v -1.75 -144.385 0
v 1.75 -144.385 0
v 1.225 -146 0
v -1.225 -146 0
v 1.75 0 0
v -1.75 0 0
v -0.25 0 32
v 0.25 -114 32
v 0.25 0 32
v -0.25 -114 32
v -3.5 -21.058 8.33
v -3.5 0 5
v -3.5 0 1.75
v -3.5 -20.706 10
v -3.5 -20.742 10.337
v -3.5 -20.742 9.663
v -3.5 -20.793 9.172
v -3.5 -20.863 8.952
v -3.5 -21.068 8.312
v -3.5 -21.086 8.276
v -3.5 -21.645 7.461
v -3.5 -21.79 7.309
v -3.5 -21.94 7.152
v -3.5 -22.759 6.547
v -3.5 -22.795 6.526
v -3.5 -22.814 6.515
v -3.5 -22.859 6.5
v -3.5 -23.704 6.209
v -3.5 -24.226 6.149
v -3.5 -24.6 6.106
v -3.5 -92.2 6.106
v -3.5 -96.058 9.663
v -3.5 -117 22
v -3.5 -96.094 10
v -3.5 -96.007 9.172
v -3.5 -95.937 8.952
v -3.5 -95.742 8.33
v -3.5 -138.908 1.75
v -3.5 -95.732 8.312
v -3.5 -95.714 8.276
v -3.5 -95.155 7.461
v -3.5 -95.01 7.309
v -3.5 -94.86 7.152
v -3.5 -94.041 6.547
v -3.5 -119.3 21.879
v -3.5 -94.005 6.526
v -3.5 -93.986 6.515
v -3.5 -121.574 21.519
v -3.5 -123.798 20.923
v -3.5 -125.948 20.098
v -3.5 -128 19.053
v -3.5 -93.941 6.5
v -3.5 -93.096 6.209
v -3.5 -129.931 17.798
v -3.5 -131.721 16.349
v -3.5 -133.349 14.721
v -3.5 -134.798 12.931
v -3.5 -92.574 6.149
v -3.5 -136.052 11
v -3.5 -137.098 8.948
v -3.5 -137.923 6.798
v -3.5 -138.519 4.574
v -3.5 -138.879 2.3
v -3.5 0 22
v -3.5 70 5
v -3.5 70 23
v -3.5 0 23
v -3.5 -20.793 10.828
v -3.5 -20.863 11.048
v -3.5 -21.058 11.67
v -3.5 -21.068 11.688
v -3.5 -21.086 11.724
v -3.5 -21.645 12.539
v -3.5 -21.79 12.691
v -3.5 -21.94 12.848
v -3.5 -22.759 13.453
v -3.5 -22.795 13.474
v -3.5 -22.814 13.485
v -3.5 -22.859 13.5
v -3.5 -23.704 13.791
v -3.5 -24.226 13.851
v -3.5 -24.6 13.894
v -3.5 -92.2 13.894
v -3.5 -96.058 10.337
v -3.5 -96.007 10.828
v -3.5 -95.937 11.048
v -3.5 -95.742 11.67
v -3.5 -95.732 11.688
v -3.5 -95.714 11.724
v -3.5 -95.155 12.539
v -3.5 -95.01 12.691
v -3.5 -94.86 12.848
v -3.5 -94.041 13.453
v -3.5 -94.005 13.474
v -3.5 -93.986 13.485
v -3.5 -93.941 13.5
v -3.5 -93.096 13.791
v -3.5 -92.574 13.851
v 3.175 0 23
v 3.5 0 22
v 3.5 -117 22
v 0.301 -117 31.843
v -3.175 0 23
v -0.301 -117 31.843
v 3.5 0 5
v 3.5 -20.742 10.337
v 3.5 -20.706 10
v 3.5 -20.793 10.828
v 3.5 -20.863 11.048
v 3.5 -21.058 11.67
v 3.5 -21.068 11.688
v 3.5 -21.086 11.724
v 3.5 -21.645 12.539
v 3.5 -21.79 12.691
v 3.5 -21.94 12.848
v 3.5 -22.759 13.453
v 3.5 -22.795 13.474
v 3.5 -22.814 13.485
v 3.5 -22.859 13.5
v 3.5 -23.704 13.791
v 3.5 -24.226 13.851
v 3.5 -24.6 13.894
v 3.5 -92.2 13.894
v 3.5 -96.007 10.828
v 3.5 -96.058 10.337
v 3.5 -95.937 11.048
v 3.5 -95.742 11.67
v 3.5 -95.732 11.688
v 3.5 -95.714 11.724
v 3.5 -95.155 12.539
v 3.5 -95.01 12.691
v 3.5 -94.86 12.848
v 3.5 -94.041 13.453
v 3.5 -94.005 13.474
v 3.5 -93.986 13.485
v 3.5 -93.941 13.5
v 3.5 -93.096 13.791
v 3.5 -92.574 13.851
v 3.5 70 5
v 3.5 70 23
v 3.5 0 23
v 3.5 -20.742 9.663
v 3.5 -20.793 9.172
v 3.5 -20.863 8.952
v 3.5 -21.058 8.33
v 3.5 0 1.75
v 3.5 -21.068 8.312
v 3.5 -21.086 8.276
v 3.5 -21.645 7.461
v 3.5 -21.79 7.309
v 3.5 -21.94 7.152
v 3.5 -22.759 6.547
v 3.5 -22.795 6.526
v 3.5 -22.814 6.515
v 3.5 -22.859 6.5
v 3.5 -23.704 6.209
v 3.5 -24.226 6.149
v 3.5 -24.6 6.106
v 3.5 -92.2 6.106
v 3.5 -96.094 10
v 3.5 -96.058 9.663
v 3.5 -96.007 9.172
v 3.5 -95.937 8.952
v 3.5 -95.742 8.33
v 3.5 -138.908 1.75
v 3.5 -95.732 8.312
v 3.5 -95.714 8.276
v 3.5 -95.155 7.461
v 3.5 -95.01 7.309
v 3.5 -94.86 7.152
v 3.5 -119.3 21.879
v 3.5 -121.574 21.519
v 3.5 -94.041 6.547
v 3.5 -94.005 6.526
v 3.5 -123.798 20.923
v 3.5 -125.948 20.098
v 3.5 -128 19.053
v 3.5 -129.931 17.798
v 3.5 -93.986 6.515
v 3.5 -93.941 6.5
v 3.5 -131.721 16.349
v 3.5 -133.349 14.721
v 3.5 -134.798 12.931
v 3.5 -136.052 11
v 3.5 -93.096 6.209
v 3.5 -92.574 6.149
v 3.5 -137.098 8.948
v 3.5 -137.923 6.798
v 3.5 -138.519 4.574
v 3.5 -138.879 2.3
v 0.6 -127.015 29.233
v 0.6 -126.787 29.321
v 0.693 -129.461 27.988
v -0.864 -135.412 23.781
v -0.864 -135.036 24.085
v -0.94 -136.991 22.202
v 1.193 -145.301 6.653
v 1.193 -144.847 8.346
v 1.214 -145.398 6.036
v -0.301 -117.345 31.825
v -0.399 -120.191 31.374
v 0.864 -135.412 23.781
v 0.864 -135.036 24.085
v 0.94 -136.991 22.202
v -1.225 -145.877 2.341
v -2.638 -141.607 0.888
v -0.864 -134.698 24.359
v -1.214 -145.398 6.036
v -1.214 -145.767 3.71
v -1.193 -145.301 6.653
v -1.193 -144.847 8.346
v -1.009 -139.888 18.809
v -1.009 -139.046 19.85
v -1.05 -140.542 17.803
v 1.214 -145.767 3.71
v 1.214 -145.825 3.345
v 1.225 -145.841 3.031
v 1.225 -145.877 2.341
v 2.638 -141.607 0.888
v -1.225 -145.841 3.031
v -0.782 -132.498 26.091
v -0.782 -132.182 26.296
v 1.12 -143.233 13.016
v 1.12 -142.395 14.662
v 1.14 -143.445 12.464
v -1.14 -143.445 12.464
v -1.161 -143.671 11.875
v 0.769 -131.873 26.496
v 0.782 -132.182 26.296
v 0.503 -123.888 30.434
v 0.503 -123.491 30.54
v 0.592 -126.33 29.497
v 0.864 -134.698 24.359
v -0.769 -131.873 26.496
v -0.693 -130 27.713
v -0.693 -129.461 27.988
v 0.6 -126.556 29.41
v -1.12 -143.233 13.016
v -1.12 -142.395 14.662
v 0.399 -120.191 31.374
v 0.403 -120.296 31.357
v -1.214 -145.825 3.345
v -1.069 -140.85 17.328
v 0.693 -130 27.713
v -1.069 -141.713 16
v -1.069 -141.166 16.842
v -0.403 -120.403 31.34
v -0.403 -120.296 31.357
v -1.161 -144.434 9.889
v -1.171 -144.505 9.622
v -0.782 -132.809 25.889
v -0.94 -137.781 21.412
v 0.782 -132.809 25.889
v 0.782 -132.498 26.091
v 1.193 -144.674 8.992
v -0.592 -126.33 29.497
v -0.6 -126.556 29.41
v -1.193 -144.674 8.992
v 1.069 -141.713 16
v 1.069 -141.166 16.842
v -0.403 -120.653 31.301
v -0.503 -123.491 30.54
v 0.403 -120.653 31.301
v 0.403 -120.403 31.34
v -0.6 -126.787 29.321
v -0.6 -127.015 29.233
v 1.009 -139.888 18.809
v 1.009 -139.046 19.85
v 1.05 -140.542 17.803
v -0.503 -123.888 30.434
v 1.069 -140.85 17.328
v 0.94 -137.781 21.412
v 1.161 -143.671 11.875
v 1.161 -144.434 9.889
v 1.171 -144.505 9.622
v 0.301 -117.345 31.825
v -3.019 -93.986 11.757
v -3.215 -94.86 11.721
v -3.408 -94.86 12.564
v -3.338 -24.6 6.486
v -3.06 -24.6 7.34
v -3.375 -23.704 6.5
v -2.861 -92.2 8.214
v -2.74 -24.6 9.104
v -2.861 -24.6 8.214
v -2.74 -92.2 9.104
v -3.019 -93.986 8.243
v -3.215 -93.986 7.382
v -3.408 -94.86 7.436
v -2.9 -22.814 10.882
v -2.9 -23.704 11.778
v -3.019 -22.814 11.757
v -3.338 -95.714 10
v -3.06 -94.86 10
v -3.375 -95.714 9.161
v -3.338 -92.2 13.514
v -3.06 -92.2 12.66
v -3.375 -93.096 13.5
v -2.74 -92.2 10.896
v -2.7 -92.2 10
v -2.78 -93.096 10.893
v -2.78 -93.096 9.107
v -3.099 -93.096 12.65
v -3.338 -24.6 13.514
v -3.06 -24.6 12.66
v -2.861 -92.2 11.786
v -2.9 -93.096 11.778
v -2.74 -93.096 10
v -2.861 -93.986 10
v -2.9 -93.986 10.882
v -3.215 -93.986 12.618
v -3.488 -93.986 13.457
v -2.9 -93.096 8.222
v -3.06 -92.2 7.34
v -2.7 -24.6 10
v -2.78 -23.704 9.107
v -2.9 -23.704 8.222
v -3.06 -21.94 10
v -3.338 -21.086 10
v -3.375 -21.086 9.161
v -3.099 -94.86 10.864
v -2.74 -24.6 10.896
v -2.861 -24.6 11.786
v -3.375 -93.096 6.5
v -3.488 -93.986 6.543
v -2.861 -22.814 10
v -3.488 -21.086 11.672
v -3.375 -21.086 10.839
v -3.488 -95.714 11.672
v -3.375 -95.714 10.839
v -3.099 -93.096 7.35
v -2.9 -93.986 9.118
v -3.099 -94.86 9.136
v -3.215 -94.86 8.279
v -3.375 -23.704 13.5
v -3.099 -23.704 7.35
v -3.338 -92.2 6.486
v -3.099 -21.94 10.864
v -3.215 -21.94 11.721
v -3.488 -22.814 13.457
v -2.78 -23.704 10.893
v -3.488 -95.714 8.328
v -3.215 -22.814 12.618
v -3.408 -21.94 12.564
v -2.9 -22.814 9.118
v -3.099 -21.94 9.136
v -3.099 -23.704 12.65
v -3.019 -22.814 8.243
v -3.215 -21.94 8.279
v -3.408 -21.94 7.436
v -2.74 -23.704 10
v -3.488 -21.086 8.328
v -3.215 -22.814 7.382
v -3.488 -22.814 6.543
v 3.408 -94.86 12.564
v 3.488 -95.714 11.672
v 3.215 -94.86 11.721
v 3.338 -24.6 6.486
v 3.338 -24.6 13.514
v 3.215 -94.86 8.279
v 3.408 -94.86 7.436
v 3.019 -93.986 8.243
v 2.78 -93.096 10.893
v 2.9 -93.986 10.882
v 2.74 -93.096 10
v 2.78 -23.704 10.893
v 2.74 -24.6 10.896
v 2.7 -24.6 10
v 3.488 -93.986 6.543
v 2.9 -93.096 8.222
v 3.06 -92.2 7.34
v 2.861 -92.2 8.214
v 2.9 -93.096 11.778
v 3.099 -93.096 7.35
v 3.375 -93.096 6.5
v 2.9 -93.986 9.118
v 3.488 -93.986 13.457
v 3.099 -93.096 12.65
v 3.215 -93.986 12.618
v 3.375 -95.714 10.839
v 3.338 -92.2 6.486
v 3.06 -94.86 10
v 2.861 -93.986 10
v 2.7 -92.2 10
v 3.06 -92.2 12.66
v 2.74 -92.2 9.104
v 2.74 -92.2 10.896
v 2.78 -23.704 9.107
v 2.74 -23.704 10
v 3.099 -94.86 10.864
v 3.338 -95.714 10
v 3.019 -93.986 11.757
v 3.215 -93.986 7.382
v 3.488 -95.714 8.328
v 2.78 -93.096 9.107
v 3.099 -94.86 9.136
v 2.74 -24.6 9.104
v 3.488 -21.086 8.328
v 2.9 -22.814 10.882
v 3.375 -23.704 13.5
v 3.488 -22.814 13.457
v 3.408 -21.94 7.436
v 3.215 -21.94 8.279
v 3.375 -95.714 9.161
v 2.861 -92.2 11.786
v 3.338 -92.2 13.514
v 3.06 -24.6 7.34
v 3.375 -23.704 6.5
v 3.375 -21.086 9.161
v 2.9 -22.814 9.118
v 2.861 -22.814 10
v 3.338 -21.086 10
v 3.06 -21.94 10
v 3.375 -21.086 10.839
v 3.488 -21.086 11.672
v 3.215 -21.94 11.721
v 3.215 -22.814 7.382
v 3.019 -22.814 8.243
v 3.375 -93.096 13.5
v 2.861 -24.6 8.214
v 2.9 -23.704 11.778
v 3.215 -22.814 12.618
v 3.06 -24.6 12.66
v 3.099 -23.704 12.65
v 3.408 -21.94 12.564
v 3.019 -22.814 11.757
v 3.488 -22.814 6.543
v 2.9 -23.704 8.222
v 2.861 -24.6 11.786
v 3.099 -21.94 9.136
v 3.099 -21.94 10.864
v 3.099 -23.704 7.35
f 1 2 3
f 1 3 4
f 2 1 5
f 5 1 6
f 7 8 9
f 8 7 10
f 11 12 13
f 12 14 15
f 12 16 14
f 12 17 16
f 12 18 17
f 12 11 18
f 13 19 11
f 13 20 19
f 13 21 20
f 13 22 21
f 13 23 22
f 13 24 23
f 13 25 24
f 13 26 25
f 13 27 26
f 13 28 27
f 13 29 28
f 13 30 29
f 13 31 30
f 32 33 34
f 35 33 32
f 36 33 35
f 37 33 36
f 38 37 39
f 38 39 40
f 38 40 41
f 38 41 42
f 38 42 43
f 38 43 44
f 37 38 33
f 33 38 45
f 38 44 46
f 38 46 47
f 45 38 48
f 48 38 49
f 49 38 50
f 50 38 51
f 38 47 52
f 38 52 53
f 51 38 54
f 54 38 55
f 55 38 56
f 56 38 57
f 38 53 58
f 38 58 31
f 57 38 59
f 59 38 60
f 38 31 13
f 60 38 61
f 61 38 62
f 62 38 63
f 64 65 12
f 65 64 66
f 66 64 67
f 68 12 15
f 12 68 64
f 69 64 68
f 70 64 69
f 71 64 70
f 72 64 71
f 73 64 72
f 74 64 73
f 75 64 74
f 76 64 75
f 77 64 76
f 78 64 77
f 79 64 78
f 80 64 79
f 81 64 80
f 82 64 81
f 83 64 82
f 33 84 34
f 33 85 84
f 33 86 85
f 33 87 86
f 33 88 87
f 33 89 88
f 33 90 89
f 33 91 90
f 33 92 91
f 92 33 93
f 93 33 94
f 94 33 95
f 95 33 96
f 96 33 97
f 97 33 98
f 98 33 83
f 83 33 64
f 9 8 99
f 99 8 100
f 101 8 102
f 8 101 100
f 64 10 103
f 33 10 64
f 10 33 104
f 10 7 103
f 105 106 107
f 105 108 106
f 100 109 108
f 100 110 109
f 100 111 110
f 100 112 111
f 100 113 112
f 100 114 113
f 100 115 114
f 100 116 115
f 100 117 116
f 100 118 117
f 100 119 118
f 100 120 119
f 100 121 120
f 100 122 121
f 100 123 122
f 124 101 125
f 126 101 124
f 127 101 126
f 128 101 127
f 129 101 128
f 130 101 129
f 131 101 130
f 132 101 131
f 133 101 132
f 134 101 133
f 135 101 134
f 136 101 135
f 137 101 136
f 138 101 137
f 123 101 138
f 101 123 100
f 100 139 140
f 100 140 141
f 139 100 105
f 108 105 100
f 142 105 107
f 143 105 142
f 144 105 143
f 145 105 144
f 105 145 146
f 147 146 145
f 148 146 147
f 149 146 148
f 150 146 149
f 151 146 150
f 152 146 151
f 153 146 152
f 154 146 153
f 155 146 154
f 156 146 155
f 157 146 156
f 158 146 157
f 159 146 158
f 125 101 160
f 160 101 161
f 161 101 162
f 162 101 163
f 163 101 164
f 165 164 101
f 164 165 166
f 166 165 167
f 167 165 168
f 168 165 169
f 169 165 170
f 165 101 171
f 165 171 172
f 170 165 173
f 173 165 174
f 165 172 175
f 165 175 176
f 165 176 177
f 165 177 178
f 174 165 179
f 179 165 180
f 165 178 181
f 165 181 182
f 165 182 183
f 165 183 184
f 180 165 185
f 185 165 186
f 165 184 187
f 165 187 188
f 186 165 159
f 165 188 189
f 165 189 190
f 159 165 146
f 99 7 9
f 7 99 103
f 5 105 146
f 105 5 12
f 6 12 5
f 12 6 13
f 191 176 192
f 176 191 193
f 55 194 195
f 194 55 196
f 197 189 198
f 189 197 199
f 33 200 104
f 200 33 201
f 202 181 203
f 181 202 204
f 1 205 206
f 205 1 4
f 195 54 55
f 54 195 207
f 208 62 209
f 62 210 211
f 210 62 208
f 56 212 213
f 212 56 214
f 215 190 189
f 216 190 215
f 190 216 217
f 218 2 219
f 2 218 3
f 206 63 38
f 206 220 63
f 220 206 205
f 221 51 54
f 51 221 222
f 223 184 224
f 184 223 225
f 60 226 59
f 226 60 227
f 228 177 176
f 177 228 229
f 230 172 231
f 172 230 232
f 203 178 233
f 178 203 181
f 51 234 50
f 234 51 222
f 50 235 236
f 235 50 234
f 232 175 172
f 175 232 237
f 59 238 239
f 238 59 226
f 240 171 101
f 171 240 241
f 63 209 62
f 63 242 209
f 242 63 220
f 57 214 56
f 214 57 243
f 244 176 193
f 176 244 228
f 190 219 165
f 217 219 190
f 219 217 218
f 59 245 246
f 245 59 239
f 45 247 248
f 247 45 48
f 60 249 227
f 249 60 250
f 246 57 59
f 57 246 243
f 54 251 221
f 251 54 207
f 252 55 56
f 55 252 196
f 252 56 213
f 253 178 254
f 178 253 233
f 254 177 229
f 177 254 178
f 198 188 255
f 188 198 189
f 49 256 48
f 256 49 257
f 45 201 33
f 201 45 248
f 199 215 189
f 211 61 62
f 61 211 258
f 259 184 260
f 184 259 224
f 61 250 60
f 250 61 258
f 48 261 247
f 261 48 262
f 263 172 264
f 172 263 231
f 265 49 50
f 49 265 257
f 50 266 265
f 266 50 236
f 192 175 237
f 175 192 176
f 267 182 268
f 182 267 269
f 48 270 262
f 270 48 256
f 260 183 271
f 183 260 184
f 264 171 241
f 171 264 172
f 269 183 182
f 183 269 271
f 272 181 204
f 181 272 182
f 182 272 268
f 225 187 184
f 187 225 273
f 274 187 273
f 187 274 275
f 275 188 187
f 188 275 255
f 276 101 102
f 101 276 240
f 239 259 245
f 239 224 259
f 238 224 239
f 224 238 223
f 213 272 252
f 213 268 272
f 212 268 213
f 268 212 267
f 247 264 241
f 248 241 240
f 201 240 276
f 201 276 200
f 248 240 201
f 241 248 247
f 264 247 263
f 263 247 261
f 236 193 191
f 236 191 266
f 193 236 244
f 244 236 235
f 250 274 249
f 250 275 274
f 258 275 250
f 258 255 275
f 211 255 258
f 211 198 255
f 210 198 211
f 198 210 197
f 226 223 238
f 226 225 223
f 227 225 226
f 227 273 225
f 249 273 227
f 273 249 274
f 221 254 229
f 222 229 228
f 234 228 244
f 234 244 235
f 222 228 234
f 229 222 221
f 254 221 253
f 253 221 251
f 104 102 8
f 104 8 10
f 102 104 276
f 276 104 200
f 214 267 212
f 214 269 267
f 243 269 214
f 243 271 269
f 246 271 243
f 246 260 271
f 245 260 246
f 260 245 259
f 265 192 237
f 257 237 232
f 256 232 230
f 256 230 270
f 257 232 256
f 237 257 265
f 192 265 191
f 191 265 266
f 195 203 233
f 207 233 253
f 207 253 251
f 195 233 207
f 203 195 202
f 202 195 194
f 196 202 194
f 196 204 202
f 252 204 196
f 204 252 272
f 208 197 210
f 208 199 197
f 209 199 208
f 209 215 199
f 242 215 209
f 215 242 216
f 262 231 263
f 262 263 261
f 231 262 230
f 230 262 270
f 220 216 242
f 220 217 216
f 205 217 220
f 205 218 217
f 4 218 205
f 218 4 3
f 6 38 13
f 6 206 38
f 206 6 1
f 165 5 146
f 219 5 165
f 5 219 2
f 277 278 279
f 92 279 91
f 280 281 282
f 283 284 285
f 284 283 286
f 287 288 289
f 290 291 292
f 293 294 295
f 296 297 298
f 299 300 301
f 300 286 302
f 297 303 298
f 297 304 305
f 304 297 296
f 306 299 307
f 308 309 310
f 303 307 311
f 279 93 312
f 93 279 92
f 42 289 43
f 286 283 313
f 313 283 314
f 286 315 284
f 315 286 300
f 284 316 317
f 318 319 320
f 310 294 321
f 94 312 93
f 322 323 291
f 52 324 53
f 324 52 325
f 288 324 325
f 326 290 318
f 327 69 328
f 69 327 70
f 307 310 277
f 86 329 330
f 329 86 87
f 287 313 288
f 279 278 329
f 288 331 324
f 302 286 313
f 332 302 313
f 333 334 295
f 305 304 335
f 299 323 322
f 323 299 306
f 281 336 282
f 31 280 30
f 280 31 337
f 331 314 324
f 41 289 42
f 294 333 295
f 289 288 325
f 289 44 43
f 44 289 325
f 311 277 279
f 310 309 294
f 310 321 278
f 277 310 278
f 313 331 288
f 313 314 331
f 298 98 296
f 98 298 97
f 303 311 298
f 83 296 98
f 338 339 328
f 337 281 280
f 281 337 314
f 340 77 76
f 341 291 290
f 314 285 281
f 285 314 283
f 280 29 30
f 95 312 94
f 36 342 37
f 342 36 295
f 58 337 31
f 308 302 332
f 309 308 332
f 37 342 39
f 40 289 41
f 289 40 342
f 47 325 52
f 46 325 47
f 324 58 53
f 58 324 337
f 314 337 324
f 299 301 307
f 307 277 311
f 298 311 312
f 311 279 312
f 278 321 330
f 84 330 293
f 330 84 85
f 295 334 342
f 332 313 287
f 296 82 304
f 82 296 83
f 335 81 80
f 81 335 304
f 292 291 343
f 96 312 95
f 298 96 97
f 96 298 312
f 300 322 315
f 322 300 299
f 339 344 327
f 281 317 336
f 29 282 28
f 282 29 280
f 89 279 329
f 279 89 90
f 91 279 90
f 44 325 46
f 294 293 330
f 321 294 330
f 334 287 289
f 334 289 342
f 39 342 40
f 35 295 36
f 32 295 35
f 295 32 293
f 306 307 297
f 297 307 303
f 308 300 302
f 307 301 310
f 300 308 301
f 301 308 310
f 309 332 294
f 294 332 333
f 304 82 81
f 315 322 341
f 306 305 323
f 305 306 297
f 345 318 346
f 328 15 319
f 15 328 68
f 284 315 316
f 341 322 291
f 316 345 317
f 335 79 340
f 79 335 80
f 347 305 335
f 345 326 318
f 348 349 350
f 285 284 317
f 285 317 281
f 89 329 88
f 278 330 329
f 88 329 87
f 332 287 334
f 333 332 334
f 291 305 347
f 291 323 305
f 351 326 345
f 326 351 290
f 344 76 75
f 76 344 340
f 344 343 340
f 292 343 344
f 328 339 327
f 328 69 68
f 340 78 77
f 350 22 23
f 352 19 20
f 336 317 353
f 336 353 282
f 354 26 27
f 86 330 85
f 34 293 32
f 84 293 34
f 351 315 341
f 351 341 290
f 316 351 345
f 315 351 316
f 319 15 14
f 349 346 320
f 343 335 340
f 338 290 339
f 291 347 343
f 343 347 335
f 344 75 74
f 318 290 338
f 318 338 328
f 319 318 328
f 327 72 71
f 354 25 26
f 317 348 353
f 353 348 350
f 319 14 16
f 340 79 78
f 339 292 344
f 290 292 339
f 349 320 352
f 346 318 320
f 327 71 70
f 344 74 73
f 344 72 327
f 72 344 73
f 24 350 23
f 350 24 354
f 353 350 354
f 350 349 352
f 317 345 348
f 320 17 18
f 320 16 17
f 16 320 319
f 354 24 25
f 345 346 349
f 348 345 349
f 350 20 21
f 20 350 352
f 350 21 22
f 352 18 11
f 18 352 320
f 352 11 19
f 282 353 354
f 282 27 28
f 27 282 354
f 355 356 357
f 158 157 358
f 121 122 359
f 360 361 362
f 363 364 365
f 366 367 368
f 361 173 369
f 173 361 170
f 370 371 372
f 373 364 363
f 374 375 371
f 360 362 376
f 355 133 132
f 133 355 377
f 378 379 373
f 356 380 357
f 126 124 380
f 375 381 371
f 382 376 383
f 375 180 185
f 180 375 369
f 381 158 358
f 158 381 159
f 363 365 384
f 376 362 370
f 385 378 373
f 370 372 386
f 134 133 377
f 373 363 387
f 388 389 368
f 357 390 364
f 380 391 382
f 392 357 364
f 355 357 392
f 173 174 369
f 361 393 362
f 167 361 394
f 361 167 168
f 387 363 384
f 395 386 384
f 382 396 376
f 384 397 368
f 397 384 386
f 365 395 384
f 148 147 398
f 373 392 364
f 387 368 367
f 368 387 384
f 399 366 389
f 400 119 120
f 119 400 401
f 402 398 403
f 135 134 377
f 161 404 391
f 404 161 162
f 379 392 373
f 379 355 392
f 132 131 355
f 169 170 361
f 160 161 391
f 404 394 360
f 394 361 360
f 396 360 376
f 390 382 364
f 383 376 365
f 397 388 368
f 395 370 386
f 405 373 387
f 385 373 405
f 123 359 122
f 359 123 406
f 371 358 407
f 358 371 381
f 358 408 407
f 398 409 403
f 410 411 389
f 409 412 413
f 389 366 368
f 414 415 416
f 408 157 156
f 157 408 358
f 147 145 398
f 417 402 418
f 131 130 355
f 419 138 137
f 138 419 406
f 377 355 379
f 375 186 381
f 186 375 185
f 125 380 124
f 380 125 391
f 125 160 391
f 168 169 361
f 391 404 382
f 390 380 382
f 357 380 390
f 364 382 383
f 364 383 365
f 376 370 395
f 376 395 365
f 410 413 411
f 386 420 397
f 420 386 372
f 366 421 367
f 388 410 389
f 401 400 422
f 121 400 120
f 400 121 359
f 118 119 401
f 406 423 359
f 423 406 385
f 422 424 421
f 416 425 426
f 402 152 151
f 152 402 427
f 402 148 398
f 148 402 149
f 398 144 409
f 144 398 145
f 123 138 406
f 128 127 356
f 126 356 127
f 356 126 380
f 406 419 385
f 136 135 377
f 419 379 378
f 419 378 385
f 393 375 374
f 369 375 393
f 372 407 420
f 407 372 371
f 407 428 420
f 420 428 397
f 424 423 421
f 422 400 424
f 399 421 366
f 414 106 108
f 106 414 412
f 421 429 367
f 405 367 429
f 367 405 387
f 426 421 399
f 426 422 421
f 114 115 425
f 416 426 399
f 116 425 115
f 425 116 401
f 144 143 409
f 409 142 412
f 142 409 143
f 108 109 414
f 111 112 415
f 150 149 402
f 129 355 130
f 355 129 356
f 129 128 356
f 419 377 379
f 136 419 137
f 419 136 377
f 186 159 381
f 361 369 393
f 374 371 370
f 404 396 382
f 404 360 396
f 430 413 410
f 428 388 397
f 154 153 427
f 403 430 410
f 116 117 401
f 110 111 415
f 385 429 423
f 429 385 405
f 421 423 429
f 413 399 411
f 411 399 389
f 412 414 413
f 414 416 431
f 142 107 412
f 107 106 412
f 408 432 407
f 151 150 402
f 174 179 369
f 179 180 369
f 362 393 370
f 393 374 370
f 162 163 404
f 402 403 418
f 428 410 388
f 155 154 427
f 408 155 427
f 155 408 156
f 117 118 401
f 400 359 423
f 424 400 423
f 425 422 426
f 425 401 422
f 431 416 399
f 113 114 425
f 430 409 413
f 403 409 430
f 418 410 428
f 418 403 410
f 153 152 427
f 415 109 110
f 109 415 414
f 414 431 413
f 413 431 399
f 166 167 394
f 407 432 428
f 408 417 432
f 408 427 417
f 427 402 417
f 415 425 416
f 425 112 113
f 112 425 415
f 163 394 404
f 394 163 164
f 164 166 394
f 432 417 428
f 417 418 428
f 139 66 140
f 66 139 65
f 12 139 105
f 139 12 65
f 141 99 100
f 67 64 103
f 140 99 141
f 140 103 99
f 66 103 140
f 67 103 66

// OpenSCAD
eps = 0.0001;

// 0 for fast, 1 for full render.
quality = 1;

blade_length = 146;
blade_width = 7;
blade_depth = 32;
tip_blunt = 3;

tang_depth = 18;
tang_length = 70;
tang_offset = 5;

handle_width = 18;
handle_depth = 32;
handle_length = 80;

crossbar_depth = blade_depth + 20;
crossbar_width = 22;
crossbar_thickness = 4.6;

module blade_2d() {
  edge_depth = 10;
  for (a = [-1, 1])
    scale([a, 1])
      polygon([
        [-eps, 0],
        [blade_width/2, 0],
        [blade_width/2, blade_depth-edge_depth],
        [0.25, blade_depth],
        [-eps, blade_depth],
      ]);
}

module extrude_blade() {
  straight_length = blade_length - blade_depth + tip_blunt;
  linear_extrude(straight_length)
    children();
  translate([0, 0, straight_length-eps])
    rotate([0, 90, 180])
      rotate_extrude(angle=90, $fn=30+quality*30)
        rotate([0, 0, 90])
          children();
}

module pill(r, length) {
  hull()
    for (a = [-1, 1])
      scale([1, 1, a])
        translate([0, 0, length/2 - r])
          sphere(r); 
}

module blade() {
  difference() {
    intersection() {
      extrude_blade()
        blade_2d();
      translate([0, 0, -tip_blunt])
        extrude_blade()
          translate([-blade_width/2, 0])
            square([blade_width, blade_depth]);
      translate([0, blade_length*sqrt(2)-blade_width/4, 0])
        rotate([0, 0, 45])
          cube(blade_length*2, center=true);
    }
    
    depression_r = 10;
    depression_depth = 0.8;
    for (a = [-1, 1])
      scale([a, 1, 1])
        translate([blade_width/2 + depression_r - depression_depth, 10, blade_length*0.4])
          pill(r=depression_r, length=blade_length*0.6, $fn=25+quality*45);
  }
}

module tang(expand=0) {
  translate([-blade_width/2, tang_offset, eps-tang_length])
    linear_extrude(tang_length)
      offset(expand)
        square([blade_width, tang_depth]);
}

module tombstone_2d(r, length) {
  translate([length-r, 0])
    circle(r=r);
  translate([0, -r])
    square([length-r, r*2]);
}

module crossbar_2d() {
  hull()
    for (y = [crossbar_width/2, crossbar_depth-crossbar_width/2])
      translate([0, y - crossbar_depth*0.19])
        circle(r=crossbar_width/2, $fn=20+quality*50);
}

module crossbar() {
  bevel = 0.8;
  hull() {
    translate([0, 0, bevel])
      linear_extrude(crossbar_thickness - bevel*2)
        crossbar_2d();
    linear_extrude(crossbar_thickness)
      offset(-bevel)
        crossbar_2d();
  }
}

module handle() {
  $fn = 30 + quality*30;
  r = handle_width/2;

  difference() {
    union() {
      difference() {
        translate([0, handle_depth + 1, -handle_length]) {
          rotate([0, 0, -90]) {
            intersection() {
              linear_extrude(handle_length)
                tombstone_2d(r, handle_depth);
              
              grip_r = handle_length * 2.5;
              translate([grip_r, 0, handle_length/2])
                rotate([90, 0, 0], $fn=100+quality*250)
                  rotate_extrude()
                    tombstone_2d(r, grip_r);
            }
          }
        }
        
        // Finger sculpts.
        translate([0, handle_depth, 0]) {
          translate([0, 6.8, -7.5]) finger_sculpt();
          translate([0, 8.7, -26]) finger_sculpt();
          translate([0, 8.7, -46]) finger_sculpt();
          translate([0, 7.5, -66]) finger_sculpt();
        }
        
        // Knurling.
        knurl = 0.6;
        knurl_spacing = 5;
        for (a = [-1, 1], b = [0:20])
          translate([a*handle_width/2, 0, 30 - b*knurl_spacing])
            rotate([-30, 0, 0])
              rotate([0, 45, 0])
                cube([knurl, 100, knurl], center=true);
      }

      // Pommel.
      translate([0, handle_depth/2+1, -handle_length])
        scale([1, 1, 0.7])
          rotate([90, 0, 0])
            pill(handle_width*0.75, handle_depth+3);
      
      translate([0, 0, -eps])
        crossbar();
    }
    
    // Flatten bottom of pommel.
    translate([0, 0, -handle_length-40-handle_width*0.4])
      cube(80, center=true);
    
    // Cavity for tang.
    for (z = [2, -2])
      translate([0, 0, z])
        tang(expand=0.3);
    
    // Cavity in crossbar for blade.
    translate([0, 0, 1.2])
      linear_extrude(crossbar_thickness)
        offset(0.25)
          blade_2d();
    
    // Air hole in base of pommel.
    translate([0, handle_depth/2, -500])
      cylinder(h=1000, d=1.1);
  }
}

module finger_sculpt() {
  $fn = 30 + quality*40;

  scale([handle_width/2, 5, 10]) {
    translate([0, -1, 0]) {
      rotate([90, 0, 90]) {
        rotate_extrude() {
          difference() {
            translate([0, -1])
              square(2);
            translate([2, 0])
              circle(d=2);
          }
        }
      }
    }
  }
}

module blade_print() {
  rotate([90, 0, 0]) {
    blade();
    tang();
  }
}

blade_print();
